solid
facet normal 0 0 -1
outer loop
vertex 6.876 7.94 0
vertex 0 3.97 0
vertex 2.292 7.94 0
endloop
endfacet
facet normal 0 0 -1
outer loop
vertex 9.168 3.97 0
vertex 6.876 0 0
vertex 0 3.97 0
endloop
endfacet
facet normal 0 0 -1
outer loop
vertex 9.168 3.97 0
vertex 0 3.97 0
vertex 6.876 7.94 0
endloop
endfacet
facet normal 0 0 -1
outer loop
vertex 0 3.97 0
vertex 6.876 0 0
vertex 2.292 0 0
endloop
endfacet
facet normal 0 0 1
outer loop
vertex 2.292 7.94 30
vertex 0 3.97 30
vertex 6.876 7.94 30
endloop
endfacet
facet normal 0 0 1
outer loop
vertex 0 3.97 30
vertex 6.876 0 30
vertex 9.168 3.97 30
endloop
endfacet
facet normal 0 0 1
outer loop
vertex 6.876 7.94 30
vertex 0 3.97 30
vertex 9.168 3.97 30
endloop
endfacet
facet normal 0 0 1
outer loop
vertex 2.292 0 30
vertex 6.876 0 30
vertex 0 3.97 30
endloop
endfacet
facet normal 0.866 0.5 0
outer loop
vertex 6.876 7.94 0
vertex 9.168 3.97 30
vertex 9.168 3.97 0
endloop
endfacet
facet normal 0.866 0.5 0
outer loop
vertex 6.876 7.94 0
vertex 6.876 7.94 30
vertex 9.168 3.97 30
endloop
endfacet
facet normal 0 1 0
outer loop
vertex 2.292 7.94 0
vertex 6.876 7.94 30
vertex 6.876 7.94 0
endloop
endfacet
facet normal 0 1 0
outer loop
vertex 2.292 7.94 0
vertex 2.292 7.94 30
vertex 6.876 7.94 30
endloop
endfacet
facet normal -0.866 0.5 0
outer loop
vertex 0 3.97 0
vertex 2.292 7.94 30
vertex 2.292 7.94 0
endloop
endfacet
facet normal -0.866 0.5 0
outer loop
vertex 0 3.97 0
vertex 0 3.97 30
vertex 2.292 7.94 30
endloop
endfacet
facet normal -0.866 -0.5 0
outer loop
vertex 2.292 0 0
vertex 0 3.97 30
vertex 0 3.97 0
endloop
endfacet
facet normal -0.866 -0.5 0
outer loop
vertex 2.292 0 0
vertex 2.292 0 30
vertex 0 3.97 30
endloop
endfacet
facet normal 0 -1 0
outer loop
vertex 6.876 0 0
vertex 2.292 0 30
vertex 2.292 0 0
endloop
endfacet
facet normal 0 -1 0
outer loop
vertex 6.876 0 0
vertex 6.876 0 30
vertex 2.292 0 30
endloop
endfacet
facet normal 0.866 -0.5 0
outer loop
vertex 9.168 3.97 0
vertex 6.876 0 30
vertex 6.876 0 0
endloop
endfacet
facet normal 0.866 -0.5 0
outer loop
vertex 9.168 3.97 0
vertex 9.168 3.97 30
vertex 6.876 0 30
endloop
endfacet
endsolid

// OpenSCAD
$fn = 32;

// ----------------------------------------------------------------------
// Key bar: hex key, 30 mm thick
// ----------------------------------------------------------------------

// --- parameters (mm) ---
profile_height = 30;      // extrusion height
profile_points = 6;       // points of the closed outline

profile = [[9.168, 3.97], [6.876, 7.94], [2.292, 7.94], [0, 3.97], [2.292, 0], [6.876, 0]];  // single closed polygon, 6 points, counter clockwise

// --- the one profile operation ---
linear_extrude(height = profile_height) polygon(points = profile);
